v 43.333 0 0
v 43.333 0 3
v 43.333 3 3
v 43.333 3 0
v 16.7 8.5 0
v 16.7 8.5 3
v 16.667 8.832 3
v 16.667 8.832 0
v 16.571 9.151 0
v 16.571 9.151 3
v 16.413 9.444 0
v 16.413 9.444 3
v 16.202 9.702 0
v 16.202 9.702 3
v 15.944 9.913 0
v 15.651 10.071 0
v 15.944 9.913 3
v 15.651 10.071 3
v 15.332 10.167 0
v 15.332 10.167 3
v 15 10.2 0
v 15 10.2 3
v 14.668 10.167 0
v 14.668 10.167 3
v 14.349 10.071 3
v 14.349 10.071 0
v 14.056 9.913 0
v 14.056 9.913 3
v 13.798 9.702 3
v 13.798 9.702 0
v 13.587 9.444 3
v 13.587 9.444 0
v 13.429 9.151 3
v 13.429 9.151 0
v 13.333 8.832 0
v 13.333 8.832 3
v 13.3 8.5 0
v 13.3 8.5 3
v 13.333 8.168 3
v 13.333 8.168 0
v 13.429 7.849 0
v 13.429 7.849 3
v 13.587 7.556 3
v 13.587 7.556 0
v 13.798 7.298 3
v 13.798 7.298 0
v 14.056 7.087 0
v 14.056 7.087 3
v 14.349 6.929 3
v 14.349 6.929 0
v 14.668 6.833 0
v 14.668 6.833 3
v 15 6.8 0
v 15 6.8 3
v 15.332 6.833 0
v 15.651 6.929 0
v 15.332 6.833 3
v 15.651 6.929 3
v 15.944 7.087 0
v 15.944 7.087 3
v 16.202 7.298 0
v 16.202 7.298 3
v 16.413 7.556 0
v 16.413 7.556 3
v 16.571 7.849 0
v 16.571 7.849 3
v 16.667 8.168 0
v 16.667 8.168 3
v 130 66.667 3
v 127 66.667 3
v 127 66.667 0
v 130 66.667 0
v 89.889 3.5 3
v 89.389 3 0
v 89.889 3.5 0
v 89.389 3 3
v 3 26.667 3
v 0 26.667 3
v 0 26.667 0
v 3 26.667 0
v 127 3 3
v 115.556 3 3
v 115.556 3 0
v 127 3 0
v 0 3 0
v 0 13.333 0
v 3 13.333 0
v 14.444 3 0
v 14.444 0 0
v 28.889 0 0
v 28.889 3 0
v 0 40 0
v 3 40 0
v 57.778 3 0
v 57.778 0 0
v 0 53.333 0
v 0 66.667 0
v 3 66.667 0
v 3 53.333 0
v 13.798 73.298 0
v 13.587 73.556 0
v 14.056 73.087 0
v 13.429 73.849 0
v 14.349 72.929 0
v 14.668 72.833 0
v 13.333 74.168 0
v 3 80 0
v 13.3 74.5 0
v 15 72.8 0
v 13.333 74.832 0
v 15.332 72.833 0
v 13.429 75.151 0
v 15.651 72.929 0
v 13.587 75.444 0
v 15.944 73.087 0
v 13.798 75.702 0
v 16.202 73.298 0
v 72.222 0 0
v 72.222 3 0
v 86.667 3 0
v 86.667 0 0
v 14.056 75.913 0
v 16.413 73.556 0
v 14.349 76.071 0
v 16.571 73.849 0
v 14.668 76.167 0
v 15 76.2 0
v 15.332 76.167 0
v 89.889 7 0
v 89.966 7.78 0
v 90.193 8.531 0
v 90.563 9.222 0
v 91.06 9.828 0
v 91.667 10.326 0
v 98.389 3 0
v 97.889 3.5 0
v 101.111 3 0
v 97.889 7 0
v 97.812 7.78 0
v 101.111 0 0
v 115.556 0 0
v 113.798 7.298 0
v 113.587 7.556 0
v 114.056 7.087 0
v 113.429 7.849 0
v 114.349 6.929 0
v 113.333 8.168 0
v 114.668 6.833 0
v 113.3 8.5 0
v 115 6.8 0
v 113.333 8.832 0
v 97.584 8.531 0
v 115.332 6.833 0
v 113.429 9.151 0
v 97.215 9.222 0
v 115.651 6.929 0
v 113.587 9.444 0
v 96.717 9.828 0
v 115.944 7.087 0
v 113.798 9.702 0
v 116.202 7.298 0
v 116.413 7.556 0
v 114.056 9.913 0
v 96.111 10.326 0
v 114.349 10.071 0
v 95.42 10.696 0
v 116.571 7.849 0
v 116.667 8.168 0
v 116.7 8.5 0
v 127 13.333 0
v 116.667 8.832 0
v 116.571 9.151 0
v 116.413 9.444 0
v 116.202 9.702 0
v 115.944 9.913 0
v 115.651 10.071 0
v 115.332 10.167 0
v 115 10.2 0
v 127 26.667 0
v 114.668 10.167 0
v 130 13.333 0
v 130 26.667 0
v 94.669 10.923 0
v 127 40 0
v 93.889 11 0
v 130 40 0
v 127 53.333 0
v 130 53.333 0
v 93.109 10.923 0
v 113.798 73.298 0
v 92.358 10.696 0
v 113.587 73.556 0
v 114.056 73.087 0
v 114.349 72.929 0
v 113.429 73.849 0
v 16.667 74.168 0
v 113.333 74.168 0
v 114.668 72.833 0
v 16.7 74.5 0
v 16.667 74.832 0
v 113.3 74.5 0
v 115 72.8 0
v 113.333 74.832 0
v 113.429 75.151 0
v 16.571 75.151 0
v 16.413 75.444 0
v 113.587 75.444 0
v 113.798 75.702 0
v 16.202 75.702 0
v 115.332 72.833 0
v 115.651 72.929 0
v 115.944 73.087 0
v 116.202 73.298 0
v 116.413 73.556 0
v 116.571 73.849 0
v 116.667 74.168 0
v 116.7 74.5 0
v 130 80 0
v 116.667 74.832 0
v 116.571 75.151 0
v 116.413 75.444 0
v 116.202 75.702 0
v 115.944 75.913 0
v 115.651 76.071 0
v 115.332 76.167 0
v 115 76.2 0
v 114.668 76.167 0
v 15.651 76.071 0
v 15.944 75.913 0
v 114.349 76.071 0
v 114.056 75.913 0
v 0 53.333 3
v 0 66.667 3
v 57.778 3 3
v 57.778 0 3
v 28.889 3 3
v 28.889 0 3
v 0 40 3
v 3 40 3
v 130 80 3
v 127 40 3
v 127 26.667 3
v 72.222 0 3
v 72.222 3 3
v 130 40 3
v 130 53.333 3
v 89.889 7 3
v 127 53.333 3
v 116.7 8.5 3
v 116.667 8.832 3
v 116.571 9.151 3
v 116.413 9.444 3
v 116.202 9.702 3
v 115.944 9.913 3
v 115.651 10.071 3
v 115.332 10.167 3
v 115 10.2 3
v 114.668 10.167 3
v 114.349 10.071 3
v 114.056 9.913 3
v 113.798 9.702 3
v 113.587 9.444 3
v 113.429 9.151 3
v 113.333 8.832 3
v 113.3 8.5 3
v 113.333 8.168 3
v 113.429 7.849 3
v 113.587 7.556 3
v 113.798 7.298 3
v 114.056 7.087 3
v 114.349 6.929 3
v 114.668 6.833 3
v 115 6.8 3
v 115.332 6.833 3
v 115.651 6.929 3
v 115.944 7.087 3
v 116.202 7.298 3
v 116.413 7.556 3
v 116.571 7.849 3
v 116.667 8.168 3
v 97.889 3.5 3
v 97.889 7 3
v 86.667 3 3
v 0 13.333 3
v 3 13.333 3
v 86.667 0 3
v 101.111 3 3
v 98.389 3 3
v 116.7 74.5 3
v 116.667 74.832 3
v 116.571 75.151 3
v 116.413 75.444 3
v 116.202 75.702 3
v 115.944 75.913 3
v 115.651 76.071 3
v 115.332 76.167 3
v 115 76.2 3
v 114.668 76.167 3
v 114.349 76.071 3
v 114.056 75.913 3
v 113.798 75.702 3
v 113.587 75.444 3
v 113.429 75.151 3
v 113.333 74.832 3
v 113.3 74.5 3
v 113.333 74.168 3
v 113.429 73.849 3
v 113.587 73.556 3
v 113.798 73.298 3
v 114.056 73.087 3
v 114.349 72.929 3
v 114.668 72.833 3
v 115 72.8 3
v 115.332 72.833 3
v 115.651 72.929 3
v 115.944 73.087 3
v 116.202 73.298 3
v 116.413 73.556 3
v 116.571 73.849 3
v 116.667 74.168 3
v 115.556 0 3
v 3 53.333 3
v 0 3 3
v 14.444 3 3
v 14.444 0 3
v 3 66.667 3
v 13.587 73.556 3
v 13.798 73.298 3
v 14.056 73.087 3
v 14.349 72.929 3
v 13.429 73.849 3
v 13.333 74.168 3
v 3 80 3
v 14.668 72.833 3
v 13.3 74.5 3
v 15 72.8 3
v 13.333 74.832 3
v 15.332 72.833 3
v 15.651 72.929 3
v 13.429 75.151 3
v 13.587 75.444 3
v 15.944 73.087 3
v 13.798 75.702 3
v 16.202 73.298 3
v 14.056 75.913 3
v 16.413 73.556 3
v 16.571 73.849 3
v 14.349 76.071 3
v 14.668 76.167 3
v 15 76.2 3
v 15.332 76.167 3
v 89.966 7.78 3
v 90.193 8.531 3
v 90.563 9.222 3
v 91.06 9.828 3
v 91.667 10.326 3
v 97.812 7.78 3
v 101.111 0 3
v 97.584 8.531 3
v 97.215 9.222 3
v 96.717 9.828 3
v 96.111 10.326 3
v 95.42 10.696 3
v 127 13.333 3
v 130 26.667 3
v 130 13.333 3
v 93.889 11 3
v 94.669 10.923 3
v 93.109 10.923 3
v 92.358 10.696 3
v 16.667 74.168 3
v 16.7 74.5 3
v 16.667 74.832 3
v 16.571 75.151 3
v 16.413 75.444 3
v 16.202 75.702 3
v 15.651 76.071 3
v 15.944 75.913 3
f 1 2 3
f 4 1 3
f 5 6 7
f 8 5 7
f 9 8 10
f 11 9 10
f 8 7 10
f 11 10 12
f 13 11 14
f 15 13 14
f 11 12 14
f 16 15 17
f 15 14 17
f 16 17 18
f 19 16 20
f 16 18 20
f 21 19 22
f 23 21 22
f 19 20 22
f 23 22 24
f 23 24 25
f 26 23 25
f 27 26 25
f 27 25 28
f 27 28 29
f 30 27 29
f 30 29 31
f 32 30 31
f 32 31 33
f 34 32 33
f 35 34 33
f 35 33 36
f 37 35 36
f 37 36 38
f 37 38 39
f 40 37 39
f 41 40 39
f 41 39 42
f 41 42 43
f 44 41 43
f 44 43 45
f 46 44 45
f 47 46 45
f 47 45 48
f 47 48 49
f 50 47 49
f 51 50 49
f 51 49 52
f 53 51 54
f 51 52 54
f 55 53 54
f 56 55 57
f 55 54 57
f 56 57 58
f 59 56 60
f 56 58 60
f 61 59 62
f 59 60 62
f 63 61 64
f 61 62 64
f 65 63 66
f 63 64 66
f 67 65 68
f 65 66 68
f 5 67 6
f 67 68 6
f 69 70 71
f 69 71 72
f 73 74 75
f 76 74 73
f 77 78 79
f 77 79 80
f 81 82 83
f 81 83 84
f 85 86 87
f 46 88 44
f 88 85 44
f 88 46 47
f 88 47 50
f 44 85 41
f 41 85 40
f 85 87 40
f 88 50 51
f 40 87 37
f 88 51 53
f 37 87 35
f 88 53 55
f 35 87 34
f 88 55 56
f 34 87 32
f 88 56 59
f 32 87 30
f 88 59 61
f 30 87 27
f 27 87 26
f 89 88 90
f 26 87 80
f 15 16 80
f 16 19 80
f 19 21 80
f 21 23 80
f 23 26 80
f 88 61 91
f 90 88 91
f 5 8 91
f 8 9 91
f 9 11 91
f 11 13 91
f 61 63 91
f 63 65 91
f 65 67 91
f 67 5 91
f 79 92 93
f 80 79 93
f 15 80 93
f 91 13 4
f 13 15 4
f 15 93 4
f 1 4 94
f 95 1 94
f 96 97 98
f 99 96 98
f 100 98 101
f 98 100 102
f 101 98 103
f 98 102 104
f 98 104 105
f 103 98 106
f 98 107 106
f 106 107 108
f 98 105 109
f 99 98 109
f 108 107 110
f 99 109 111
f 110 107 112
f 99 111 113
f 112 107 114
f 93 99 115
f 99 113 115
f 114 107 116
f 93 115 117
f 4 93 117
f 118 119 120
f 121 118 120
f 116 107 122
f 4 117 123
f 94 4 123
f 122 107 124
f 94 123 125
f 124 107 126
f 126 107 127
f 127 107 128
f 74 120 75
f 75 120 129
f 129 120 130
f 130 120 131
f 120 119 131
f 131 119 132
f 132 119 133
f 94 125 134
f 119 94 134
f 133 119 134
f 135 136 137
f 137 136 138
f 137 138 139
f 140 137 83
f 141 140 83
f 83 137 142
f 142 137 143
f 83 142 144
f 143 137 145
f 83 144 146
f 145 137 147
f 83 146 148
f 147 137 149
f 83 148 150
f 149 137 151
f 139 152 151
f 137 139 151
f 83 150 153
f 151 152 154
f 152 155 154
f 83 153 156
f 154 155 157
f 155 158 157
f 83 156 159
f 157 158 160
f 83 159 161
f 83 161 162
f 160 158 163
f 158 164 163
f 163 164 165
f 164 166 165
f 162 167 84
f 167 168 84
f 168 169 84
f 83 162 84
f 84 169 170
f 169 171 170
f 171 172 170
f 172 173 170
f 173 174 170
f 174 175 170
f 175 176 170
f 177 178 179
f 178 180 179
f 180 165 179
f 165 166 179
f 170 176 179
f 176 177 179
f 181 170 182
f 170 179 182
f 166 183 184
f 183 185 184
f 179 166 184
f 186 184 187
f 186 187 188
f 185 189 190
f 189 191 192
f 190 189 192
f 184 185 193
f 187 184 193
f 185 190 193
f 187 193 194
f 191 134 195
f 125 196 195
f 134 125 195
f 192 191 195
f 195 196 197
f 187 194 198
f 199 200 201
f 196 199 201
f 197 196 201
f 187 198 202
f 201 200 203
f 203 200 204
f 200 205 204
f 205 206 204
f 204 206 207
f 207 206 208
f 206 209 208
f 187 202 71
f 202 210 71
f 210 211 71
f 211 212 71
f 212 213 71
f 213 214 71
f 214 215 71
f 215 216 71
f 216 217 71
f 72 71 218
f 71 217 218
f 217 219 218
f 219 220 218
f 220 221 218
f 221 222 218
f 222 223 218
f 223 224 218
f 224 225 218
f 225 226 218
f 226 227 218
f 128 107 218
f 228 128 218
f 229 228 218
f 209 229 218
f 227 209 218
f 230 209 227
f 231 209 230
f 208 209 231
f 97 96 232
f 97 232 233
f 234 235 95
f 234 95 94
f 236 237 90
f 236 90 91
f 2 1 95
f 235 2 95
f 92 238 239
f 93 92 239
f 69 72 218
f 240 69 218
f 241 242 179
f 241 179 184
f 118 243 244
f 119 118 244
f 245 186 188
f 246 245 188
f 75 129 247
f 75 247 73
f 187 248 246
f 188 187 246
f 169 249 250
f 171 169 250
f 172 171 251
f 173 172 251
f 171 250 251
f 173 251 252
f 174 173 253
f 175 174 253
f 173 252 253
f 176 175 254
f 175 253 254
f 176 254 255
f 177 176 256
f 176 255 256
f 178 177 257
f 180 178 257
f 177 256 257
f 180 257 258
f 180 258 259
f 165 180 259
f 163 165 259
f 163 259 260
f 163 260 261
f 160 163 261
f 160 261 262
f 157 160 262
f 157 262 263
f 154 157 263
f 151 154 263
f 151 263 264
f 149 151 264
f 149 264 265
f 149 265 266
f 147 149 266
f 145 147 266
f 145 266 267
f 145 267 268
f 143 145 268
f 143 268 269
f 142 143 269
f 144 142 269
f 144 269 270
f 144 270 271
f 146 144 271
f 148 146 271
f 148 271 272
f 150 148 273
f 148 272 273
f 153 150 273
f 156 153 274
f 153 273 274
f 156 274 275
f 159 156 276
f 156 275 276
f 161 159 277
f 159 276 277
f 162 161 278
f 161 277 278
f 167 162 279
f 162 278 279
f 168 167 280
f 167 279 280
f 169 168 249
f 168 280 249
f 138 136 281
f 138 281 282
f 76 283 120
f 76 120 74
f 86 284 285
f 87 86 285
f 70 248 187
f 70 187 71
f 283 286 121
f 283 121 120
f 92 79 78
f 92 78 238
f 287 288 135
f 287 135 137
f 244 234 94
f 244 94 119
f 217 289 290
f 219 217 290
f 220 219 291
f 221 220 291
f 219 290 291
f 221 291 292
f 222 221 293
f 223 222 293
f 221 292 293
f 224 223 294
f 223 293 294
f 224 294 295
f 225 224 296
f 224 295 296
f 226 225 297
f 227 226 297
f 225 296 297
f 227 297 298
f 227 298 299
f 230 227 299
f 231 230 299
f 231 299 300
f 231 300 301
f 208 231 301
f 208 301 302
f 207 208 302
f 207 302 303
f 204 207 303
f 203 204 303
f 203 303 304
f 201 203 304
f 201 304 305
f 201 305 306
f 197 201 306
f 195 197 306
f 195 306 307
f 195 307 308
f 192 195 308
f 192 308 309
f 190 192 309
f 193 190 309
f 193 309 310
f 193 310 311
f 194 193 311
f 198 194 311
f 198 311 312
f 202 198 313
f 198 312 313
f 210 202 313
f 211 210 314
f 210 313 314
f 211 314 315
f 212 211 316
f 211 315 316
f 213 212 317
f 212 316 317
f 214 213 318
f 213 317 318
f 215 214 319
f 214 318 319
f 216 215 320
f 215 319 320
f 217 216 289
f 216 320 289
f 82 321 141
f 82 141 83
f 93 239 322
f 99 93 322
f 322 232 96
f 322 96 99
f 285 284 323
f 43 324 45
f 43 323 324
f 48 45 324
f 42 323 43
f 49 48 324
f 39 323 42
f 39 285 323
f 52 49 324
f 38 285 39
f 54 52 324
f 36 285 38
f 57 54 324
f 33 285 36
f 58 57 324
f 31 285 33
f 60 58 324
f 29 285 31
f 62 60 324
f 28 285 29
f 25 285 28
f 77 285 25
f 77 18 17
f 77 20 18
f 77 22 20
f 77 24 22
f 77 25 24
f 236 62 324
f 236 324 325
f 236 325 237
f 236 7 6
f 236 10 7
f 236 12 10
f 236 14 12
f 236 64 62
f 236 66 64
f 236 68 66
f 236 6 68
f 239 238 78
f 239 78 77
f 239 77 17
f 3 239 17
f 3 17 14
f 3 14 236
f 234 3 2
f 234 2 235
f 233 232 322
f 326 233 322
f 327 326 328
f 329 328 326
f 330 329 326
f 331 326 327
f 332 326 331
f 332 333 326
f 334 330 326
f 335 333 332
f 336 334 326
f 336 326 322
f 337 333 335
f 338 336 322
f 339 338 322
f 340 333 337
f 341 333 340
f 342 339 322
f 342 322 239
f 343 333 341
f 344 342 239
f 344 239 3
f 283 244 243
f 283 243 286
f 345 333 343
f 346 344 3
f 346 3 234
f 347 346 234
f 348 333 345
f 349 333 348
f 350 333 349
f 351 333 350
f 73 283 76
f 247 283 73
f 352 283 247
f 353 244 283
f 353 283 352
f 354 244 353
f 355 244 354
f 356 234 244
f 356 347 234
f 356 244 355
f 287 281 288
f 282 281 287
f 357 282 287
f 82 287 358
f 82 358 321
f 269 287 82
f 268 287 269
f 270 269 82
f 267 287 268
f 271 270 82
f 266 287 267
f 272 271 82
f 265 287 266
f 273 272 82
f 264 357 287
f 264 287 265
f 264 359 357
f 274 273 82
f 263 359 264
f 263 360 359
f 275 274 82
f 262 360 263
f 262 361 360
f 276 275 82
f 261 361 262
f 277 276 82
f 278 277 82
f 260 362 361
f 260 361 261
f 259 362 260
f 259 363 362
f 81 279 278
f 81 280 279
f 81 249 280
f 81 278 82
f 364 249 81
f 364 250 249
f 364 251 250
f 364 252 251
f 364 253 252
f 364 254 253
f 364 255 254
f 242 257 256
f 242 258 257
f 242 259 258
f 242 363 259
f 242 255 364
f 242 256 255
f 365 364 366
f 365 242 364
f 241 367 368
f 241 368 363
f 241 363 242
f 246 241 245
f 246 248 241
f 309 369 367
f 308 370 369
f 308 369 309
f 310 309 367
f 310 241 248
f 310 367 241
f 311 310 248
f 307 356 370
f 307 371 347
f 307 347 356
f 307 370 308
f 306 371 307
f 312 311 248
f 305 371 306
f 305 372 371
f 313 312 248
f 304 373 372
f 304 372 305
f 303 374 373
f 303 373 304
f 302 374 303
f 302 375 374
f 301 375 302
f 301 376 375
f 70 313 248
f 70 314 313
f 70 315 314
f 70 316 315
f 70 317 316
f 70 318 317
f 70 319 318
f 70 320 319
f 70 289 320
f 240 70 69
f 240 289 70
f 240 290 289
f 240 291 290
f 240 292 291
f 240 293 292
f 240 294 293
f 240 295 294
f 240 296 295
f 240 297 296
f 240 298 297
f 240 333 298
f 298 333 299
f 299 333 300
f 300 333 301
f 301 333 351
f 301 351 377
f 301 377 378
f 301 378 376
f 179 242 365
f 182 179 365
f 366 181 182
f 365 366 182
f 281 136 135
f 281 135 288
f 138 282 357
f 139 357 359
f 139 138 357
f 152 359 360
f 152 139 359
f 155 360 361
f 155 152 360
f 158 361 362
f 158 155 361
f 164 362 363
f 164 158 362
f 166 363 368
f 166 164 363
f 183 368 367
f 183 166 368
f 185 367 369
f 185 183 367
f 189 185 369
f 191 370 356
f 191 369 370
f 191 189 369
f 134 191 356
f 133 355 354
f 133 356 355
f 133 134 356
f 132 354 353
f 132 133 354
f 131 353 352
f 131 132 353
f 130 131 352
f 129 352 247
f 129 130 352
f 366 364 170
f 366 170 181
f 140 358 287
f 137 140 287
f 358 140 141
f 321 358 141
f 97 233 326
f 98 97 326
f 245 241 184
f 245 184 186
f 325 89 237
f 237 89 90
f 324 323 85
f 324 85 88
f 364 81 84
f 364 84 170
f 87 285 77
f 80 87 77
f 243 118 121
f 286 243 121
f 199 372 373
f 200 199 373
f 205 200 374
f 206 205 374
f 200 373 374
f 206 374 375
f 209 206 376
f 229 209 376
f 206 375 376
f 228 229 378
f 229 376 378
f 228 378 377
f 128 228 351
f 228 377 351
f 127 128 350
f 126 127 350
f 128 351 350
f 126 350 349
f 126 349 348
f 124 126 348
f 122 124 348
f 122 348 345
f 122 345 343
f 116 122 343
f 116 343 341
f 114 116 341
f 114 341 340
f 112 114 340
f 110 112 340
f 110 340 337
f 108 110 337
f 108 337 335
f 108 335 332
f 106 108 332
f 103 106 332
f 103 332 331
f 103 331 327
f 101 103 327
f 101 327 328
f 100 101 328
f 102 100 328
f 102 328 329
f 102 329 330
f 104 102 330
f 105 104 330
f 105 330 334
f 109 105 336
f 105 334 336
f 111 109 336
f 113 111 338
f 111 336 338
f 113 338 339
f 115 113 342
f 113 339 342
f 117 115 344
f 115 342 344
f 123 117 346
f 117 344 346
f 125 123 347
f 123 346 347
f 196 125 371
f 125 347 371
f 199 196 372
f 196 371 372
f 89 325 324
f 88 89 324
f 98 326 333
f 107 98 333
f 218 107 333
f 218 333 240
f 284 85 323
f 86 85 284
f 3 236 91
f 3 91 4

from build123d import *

# Parameters (mm, degrees)
SKETCH1_W                      = 130
SKETCH1_H                      = 80
BOSS_EXTRUDE1_DEPTH            = 3
SKETCH2_W                      = 14.444444444
SKETCH2_H                      = 3
SKETCH2_W_2                    = 3
SKETCH2_H_2                    = 13.333333334
SKETCH2_H_3                    = 13.333333333
CUT_TABS_DEPTH                 = 153.672852859
CUT_CORNERPIECE_HOLES_REACH    = 154.673
SKETCH3_R                      = 1.7
CUT_POWER_CORD_CLEARANCE_REACH = 154.673
CHAMFER1_SIZE                  = 0.5


with BuildPart() as part:
    # Sketch1 → Boss-Extrude1 (new body)
    with BuildSketch(Plane.XY):
        with Locations((65, 40)):
            Rectangle(SKETCH1_W, SKETCH1_H)
    extrude(amount=BOSS_EXTRUDE1_DEPTH)

    # Sketch2 → Cut tabs (cut, through all)
    with BuildSketch(Plane.XY.offset(3)):
        with Locations((7.222222222, 1.5)):
            Rectangle(SKETCH2_W, SKETCH2_H)
        with Locations((36.111111111, 1.5)):
            Rectangle(SKETCH2_W, SKETCH2_H)
        with Locations((65, 1.5)):
            Rectangle(SKETCH2_W, SKETCH2_H)
        with Locations((93.888888889, 1.5)):
            Rectangle(SKETCH2_W, SKETCH2_H)
        Polygon((115.555555556, 0), (115.555555556, 3), (127, 3), (127, 13.333333333), (130, 13.333333333), (130, 0), align=None)
        with Locations((1.5, 20)):
            Rectangle(SKETCH2_W_2, SKETCH2_H_2)
        with Locations((1.5, 46.666666667)):
            Rectangle(SKETCH2_W_2, SKETCH2_H_3)
        with Locations((1.5, 73.333333334)):
            Rectangle(SKETCH2_W_2, SKETCH2_H_3)
        with Locations((128.5, 33.333333334)):
            Rectangle(SKETCH2_W_2, SKETCH2_H_3)
        with Locations((128.5, 60)):
            Rectangle(SKETCH2_W_2, SKETCH2_H_2)
    extrude(amount=-CUT_TABS_DEPTH, mode=Mode.SUBTRACT)

    # Sketch3 → Cut cornerpiece holes (cut, up to next)
    with BuildSketch(Plane.XY.offset(3), mode=Mode.PRIVATE) as cut_cornerpiece_holes_sk1:
        with Locations((15, 74.5)):
            Circle(SKETCH3_R)
    cut_cornerpiece_holes_tool1 = extrude(cut_cornerpiece_holes_sk1.sketch, amount=-CUT_CORNERPIECE_HOLES_REACH, mode=Mode.PRIVATE) & part.part
    # Sketch3 → Cut cornerpiece holes (cut, up to next)
    with BuildSketch(Plane.XY.offset(3), mode=Mode.PRIVATE) as cut_cornerpiece_holes_sk2:
        with Locations((115, 74.5)):
            Circle(SKETCH3_R)
    cut_cornerpiece_holes_tool2 = extrude(cut_cornerpiece_holes_sk2.sketch, amount=-CUT_CORNERPIECE_HOLES_REACH, mode=Mode.PRIVATE) & part.part
    # Sketch3 → Cut cornerpiece holes (cut, up to next)
    with BuildSketch(Plane.XY.offset(3), mode=Mode.PRIVATE) as cut_cornerpiece_holes_sk3:
        with Locations((15, 8.5)):
            Circle(SKETCH3_R)
    cut_cornerpiece_holes_tool3 = extrude(cut_cornerpiece_holes_sk3.sketch, amount=-CUT_CORNERPIECE_HOLES_REACH, mode=Mode.PRIVATE) & part.part
    # Sketch3 → Cut cornerpiece holes (cut, up to next)
    with BuildSketch(Plane.XY.offset(3), mode=Mode.PRIVATE) as cut_cornerpiece_holes_sk4:
        with Locations((115, 8.5)):
            Circle(SKETCH3_R)
    cut_cornerpiece_holes_tool4 = extrude(cut_cornerpiece_holes_sk4.sketch, amount=-CUT_CORNERPIECE_HOLES_REACH, mode=Mode.PRIVATE) & part.part
    add(cut_cornerpiece_holes_tool1.solids().sort_by_distance((15, 74.5, 3))[0], mode=Mode.SUBTRACT)
    add(cut_cornerpiece_holes_tool2.solids().sort_by_distance((115, 74.5, 3))[0], mode=Mode.SUBTRACT)
    add(cut_cornerpiece_holes_tool3.solids().sort_by_distance((15, 8.5, 3))[0], mode=Mode.SUBTRACT)
    add(cut_cornerpiece_holes_tool4.solids().sort_by_distance((115, 8.5, 3))[0], mode=Mode.SUBTRACT)

    # Sketch4 → Cut power cord clearance (cut, up to next)
    with BuildSketch(Plane(origin=(0, 0, 0), x_dir=(-1, 0, 0), z_dir=(0, 0, -1)), mode=Mode.PRIVATE) as cut_power_cord_clearance_sk1:
        with BuildLine():
            Line((-97.888888889, 3), (-97.888888889, 7))
            ThreePointArc((-97.888888889, 7), (-93.888888889, 11), (-89.888888889, 7))
            Line((-89.888888889, 7), (-89.888888889, 3))
            Line((-89.888888889, 3), (-97.888888889, 3))
        make_face()
    cut_power_cord_clearance_tool1 = extrude(cut_power_cord_clearance_sk1.sketch, amount=-CUT_POWER_CORD_CLEARANCE_REACH, mode=Mode.PRIVATE) & part.part
    add(cut_power_cord_clearance_tool1.solids().sort_by_distance((93.888889, 6.626601, 0))[0], mode=Mode.SUBTRACT)

    # Chamfer1
    chamfer1_edges = [part.edges().sort_by_distance(p)[0] for p in [
        (89.888888889, 3, 1.5),
        (97.888888889, 3, 1.5),
    ]]
    chamfer(chamfer1_edges, length=CHAMFER1_SIZE)


solid = part.part
